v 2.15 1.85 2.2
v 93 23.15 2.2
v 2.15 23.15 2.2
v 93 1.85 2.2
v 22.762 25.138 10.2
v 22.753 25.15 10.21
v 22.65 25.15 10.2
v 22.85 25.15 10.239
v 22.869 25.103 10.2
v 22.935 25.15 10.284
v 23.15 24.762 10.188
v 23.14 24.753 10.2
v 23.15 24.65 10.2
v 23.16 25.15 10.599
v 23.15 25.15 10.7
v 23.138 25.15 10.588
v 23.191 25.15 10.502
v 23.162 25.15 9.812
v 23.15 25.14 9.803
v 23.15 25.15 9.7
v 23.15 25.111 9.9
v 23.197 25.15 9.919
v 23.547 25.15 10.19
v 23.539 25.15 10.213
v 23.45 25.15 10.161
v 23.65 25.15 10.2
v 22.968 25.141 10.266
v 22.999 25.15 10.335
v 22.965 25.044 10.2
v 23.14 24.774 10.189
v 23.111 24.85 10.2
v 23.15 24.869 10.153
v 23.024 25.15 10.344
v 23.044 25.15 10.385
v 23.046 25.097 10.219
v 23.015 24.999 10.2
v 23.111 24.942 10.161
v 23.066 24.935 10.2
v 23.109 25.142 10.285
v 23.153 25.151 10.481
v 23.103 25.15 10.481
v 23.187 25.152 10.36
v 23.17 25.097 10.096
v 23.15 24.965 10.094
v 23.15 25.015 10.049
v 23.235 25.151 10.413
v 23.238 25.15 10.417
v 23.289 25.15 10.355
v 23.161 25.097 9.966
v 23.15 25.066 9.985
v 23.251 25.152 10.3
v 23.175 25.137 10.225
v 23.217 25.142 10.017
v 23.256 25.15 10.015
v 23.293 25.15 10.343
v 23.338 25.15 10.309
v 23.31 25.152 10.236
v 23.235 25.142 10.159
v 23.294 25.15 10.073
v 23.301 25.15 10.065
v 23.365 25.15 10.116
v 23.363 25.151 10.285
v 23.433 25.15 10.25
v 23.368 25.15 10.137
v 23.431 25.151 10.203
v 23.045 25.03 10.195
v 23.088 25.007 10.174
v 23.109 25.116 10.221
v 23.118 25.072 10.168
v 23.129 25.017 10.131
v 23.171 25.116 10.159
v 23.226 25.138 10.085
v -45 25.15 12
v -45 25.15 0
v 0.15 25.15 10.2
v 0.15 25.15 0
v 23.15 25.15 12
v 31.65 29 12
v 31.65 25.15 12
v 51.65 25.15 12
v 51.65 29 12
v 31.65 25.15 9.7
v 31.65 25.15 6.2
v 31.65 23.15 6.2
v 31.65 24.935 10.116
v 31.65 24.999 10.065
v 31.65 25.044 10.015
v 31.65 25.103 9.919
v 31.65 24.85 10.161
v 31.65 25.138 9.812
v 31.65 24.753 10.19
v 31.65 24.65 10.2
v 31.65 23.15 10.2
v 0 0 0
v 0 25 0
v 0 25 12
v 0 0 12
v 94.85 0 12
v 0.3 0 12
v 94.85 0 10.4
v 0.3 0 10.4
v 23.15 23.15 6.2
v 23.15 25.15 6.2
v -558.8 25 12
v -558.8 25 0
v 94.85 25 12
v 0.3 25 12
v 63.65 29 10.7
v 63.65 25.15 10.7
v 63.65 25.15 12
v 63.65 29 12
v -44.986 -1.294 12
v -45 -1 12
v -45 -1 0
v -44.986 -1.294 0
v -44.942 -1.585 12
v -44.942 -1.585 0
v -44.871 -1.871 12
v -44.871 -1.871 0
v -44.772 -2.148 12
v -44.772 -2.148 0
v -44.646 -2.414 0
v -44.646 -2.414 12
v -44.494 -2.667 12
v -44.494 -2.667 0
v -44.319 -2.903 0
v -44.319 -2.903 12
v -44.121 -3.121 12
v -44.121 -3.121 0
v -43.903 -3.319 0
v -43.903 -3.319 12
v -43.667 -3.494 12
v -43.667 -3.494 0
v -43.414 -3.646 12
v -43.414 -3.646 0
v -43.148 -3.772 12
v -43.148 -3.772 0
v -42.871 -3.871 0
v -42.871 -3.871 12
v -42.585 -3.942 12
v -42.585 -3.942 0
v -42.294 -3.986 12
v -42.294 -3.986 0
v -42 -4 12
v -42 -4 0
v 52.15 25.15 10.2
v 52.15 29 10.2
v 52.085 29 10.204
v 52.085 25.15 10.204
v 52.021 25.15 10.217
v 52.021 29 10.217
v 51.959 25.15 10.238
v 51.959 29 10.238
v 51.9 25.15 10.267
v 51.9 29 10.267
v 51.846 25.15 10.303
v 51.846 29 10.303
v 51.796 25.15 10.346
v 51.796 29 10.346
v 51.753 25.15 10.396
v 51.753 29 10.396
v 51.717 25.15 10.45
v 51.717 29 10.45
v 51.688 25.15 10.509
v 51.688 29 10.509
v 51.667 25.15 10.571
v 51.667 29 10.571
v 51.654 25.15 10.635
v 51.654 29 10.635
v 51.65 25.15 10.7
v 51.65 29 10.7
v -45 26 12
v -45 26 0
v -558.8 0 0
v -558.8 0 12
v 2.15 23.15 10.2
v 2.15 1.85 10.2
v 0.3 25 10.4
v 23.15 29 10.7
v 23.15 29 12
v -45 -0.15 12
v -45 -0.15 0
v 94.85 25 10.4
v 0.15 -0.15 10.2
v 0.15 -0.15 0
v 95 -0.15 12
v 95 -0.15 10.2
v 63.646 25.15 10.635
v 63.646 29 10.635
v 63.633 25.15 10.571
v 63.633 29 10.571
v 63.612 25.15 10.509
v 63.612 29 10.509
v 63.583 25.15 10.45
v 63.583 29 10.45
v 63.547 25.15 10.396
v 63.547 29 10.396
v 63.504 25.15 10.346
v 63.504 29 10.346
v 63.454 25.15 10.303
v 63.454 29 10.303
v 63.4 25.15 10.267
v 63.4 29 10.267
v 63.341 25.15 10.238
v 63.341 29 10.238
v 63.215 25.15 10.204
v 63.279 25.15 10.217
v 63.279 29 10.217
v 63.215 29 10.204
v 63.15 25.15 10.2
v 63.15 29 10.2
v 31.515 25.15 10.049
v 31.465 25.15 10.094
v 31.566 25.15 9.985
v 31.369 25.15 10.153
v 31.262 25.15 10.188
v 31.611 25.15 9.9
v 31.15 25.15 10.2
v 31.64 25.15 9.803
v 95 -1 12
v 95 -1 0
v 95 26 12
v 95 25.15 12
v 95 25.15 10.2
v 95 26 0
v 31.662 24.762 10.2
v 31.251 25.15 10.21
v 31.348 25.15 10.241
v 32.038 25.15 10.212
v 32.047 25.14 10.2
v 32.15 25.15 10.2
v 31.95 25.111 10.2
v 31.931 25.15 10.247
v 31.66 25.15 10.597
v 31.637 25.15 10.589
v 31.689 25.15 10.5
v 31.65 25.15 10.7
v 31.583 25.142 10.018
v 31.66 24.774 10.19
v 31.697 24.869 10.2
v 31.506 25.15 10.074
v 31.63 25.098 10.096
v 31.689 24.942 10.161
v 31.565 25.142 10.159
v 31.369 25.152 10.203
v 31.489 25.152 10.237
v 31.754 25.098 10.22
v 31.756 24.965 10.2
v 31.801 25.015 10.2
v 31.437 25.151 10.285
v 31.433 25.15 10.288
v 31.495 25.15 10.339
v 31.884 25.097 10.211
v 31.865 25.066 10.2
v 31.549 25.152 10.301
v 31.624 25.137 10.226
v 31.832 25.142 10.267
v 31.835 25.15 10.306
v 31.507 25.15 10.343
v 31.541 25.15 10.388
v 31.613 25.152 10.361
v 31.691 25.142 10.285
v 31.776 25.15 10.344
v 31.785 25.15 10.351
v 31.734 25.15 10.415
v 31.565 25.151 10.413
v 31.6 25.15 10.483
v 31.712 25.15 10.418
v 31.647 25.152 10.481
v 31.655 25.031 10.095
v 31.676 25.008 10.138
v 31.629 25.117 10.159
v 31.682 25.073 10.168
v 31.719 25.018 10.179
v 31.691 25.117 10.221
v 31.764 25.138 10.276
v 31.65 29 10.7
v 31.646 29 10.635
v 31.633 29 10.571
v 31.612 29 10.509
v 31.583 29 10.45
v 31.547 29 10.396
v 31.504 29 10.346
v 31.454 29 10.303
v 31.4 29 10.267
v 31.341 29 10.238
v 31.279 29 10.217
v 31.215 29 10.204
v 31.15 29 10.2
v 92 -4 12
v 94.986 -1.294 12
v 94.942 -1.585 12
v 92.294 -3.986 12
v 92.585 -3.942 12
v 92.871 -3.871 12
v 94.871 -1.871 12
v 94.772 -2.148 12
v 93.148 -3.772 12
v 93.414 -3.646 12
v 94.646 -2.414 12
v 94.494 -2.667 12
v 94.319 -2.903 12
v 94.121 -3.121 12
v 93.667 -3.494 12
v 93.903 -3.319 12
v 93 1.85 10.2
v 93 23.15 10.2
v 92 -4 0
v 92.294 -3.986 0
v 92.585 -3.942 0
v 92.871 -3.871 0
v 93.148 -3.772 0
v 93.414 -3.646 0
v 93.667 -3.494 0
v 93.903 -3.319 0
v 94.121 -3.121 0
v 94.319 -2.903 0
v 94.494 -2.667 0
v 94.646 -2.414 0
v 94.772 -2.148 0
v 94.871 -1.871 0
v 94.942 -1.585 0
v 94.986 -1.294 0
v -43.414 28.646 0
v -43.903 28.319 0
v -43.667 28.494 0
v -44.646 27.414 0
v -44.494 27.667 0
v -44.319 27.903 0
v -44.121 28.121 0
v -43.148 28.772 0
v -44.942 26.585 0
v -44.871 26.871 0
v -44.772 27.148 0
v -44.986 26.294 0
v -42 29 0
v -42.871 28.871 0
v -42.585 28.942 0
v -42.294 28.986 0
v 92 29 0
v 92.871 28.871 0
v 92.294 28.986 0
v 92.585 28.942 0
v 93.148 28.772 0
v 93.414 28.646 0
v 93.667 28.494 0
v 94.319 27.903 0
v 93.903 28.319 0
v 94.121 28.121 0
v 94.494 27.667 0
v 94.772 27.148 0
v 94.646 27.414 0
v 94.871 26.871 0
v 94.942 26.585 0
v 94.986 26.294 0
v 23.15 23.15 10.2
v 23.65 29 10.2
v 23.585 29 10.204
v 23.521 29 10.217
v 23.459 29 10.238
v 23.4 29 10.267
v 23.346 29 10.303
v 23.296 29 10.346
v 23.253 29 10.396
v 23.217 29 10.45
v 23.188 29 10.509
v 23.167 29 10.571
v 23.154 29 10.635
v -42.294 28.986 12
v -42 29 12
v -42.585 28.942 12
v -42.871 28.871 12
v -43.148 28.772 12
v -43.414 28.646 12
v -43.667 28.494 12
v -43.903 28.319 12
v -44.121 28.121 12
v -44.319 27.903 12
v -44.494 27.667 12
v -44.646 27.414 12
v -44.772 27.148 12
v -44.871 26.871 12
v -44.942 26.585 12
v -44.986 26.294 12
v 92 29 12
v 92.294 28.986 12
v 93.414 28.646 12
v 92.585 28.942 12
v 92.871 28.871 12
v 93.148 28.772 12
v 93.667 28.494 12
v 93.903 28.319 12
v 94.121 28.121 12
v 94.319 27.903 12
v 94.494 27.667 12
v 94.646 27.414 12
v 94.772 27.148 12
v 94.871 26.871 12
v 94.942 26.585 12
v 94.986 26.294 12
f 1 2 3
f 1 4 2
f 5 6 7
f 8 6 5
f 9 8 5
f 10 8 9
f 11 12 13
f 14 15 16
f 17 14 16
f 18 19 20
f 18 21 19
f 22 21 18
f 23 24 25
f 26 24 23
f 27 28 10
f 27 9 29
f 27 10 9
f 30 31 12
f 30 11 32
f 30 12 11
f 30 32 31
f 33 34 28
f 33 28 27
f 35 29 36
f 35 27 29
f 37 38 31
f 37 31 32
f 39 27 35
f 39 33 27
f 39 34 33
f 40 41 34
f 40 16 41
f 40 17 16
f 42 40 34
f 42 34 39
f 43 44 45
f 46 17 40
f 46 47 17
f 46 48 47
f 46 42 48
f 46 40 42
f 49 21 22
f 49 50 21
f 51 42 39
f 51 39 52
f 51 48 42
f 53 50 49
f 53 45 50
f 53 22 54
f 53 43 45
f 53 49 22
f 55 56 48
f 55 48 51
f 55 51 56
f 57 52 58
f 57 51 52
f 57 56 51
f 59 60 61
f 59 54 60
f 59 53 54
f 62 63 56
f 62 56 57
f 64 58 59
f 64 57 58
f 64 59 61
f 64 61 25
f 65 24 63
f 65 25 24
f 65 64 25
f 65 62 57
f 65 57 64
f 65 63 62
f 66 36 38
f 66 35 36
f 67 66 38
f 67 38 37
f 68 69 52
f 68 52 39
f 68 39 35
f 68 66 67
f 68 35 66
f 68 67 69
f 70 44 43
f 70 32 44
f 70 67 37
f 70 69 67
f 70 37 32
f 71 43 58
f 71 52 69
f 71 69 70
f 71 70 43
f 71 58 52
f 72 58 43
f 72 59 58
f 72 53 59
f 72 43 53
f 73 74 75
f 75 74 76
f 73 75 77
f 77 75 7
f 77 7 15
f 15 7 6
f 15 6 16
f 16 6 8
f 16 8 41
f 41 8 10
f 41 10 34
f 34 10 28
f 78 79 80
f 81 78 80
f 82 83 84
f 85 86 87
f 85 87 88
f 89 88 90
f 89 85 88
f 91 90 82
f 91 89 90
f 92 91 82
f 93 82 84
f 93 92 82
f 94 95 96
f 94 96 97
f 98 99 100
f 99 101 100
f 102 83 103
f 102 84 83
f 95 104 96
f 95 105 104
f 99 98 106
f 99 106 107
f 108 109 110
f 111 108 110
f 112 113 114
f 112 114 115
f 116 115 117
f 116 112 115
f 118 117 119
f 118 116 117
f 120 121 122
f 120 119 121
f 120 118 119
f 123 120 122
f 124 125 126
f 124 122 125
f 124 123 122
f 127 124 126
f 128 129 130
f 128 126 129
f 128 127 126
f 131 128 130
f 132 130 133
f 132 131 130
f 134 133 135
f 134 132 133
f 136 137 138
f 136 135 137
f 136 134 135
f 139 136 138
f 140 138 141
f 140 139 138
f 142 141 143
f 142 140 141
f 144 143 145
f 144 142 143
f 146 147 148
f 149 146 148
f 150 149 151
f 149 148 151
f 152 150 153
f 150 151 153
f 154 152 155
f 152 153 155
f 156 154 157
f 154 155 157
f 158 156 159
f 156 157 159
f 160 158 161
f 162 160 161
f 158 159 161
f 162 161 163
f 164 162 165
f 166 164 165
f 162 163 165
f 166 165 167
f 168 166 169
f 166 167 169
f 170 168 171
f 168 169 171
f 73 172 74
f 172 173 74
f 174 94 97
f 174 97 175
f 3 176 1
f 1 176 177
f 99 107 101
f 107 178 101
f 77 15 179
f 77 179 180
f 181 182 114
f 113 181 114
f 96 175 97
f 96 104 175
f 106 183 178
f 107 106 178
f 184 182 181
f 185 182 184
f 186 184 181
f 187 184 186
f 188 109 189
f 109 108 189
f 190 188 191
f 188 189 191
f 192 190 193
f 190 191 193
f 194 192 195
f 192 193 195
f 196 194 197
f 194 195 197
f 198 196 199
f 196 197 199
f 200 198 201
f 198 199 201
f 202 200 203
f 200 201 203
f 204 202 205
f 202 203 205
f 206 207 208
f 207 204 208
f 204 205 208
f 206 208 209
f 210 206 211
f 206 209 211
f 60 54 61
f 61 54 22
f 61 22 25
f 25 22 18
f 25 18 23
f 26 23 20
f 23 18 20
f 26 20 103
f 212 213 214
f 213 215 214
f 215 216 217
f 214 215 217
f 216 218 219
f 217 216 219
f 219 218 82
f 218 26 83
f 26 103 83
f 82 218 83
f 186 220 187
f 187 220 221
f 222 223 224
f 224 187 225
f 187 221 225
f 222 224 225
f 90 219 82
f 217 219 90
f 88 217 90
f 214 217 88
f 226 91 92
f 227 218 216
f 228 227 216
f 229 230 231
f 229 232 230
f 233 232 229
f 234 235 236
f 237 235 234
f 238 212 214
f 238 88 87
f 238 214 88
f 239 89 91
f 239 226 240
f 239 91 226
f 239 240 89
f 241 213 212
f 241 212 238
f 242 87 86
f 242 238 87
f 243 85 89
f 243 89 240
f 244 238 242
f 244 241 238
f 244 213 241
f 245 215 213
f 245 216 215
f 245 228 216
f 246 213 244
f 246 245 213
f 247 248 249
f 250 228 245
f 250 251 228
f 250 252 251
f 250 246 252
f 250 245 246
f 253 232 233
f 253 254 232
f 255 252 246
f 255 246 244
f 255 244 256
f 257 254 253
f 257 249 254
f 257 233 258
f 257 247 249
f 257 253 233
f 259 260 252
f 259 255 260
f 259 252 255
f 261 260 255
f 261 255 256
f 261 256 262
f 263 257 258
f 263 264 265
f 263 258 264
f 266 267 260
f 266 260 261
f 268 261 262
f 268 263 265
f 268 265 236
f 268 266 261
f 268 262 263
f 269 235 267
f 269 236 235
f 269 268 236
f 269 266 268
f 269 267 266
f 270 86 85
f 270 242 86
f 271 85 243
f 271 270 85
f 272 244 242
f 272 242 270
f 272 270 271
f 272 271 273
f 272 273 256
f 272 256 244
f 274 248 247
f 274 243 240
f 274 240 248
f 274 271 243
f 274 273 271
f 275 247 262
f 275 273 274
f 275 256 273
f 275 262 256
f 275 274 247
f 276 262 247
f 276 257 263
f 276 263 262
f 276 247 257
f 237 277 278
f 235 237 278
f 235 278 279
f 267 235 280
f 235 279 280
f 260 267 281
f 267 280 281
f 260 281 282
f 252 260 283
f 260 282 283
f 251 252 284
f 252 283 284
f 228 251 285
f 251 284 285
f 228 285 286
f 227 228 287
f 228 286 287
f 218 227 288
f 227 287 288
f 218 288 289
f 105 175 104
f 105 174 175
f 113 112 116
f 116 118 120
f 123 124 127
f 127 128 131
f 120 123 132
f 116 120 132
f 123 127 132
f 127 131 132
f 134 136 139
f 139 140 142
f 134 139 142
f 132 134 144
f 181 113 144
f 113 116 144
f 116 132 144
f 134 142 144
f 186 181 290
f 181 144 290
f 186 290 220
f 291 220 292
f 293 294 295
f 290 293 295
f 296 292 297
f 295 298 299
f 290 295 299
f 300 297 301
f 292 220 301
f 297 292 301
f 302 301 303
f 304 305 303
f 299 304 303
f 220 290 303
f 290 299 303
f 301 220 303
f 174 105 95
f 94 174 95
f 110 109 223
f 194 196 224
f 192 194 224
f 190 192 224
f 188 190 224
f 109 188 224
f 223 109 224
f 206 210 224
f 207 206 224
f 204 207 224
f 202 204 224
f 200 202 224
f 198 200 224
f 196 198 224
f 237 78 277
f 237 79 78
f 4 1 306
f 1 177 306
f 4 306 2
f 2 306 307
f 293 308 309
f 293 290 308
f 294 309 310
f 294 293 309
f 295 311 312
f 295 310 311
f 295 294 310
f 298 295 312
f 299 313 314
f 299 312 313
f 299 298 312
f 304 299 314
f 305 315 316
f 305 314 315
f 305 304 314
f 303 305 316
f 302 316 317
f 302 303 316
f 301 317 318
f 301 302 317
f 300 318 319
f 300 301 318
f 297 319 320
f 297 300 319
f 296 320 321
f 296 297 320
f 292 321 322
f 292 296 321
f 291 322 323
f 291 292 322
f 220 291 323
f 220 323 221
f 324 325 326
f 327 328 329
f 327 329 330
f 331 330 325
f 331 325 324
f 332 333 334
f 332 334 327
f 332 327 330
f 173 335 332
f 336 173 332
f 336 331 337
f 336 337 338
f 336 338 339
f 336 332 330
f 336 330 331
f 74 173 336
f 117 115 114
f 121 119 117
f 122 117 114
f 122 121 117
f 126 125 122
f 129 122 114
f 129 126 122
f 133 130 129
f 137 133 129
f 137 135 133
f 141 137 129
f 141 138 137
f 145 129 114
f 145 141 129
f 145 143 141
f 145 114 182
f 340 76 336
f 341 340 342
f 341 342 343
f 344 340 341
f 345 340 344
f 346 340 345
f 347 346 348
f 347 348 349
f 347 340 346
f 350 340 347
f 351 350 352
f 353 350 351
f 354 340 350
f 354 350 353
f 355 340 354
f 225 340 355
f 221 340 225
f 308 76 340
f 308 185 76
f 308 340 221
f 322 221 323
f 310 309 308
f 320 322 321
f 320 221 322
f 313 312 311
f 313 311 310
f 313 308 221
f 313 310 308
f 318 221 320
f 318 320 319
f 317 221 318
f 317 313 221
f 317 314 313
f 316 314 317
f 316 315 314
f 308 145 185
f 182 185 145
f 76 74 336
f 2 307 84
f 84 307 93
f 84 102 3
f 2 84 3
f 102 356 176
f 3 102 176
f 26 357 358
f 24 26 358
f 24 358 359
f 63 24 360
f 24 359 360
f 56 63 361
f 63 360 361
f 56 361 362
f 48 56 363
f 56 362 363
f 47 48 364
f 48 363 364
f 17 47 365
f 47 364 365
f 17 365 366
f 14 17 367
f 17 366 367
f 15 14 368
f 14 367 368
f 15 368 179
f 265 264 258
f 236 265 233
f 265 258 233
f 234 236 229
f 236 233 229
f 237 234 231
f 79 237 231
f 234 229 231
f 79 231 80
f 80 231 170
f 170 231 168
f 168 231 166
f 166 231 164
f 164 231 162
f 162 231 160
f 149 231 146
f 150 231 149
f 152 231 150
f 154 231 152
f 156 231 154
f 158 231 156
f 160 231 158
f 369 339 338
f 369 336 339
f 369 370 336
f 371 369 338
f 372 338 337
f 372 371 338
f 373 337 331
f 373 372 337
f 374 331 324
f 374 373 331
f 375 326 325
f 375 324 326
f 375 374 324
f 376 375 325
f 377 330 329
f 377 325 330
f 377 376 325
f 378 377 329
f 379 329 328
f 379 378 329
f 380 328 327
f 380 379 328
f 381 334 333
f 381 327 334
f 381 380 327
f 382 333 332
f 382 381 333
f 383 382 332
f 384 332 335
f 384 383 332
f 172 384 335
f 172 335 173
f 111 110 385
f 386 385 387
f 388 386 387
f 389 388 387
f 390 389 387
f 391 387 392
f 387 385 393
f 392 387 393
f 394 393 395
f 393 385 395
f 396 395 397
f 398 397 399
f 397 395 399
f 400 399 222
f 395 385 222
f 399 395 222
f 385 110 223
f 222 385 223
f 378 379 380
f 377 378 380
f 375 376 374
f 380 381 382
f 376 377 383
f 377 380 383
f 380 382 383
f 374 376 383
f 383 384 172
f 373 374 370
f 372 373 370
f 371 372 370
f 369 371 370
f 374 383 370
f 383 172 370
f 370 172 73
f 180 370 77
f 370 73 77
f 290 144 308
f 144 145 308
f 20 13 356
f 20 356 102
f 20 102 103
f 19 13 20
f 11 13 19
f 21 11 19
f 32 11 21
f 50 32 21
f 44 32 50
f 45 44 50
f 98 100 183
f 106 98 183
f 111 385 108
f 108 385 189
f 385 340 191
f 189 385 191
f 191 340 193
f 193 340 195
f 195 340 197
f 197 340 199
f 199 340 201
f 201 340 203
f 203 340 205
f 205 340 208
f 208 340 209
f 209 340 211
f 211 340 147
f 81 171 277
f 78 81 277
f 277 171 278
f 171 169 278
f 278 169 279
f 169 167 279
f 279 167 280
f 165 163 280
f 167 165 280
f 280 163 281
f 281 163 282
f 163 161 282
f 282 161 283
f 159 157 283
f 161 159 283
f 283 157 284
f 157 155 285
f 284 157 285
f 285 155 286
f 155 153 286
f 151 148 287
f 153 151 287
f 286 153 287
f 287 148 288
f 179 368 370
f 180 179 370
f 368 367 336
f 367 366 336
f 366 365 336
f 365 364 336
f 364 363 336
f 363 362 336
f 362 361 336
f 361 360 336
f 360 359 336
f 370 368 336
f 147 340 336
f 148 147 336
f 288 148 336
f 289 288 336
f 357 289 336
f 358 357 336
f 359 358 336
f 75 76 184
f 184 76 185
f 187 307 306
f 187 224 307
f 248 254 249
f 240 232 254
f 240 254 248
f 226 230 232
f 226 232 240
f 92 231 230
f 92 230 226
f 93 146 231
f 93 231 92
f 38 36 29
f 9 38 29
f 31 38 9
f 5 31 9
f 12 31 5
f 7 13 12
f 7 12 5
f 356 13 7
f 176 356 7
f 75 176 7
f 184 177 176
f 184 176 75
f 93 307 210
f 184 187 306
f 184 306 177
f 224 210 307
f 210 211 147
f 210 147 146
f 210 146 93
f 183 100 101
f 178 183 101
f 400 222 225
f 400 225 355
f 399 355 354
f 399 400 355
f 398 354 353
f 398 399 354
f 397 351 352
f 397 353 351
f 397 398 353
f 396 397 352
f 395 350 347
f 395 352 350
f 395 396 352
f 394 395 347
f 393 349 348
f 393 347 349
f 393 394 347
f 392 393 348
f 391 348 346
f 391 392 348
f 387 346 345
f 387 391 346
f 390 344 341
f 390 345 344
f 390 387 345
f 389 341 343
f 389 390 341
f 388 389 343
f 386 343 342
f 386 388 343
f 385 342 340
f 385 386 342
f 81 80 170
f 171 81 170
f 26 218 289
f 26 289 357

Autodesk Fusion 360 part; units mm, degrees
sketch "Sketch1" plane through (0, 0, 0) normal (0, 0, 1) x (1, 0, 0)
  line L0 (0, 0) -> (-558.8, 0)
  line L1 (-558.8, 0) -> (-558.8, 25)
  line L2 (-558.8, 25) -> (0, 25)
  line L3 (0, 25) -> (0, 0)
  dimension "d1" = 25
  dimension "d2" = 558.8
extrude "Extrude1" add sketch "Sketch1" along normal blind 12 makes body 1
sketch "Sketch2" plane through (0, 0, 0) normal (0, 0, -1) x (1, 0, 0)
  line L0 (-558.8, -25) -> (0, -25)
  line L1 (0, -25) -> (0, 0)
  line L2 (0, 0) -> (-558.8, 0)
  line L3 (-558.8, 0) -> (-558.8, -25)
  line L4 (-45, 0) -> (-45, -25)
  line L5 (-45, -25) -> (0, -25)
  line L6 (0, -25) -> (0, 0)
  line L7 (-45, 0) -> (-45, 4)
  line L8 (-45, 4) -> (95, 4)
  line L9 (95, 4) -> (95, -29)
  line L10 (95, -29) -> (-45, -29)
  line L11 (-45, -29) -> (-45, -25)
  line L12 (-45, 0) -> (0, 0)
  line L13 (-45, 0.15) -> (0.15, 0.15)
  line L14 (0.15, -25.15) -> (0.15, 0.15)
  line L15 (-45, -25.15) -> (0.15, -25.15)
  line L16 (0.15, -20) -> (-90.15, -20)
  line L17 (-90.15, -20) -> (-90.15, -5)
  line L18 (-90.15, -5) -> (0.15, -5)
  line L19 (0.15, -5) -> (0.15, -20)
  line L20 (0.15, -20) -> (-90.15, -5) construction
  line L21 (-90.15, -20) -> (0.15, -5) construction
  line L22 (-40, -25.15) -> (-40, 0.15)
  point P0 (-45, -12.5)
  dimension "d5" = 45
  dimension "d6" = 4
  dimension "d8" = -0.15
  dimension "d9" = 140
  dimension "d12" = 5
  dimension "d38" = 5
extrude "Extrude19" add sketch "Sketch2" against normal blind 12 separate body contours L7 L8 L9 L10 L11 L13 L14 L15 L19 makes body 2
sketch "Sketch10" plane through (0, 0, 12) normal (0, 0, 1) x (-1, 0, 0)
  line L0 (-0.15, 0.15) -> (45, 0.15)
  line L1 (45, 0.15) -> (45, 4)
  line L2 (45, 4) -> (-95, 4)
  line L3 (-95, 4) -> (-95, -29)
  line L4 (-95, -29) -> (45, -29)
  line L5 (45, -29) -> (45, -25.15)
  line L6 (45, -25.15) -> (-0.15, -25.15)
  line L7 (-0.15, -25.15) -> (-0.15, 0.15)
  line L8 (-0.15, 0.15) -> (-95, 0.15)
  line L9 (-95, 0.15) -> (-95, -25.15)
  line L10 (-95, -25.15) -> (-0.15, -25.15)
  line L11 (-0.15, -25.15) -> (-0.15, 0.15)
extrude "Extrude20" cut sketch "Sketch10" against normal blind 1.8 contours L3 L7 L8 L9 L10 L11 bodies 2
sketch "Sketch12" plane through (0, 0, 10.2) normal (0, 0, 1) x (-1, 0, 0)
  line L0 (-0.15, -25.15) -> (-0.15, 0.15)
  line L1 (-0.15, 0.15) -> (-95, 0.15)
  line L2 (-95, 0.15) -> (-95, -25.15)
  line L3 (-95, -25.15) -> (-0.15, -25.15)
  line L4 (-0.3, 0) -> (-94.85, 0)
  line L5 (-94.85, 0) -> (-94.85, -25)
  line L6 (-94.85, -25) -> (-0.3, -25)
  line L7 (-0.3, -25) -> (-0.3, 0)
  dimension "d98" = -0.15
extrude "Extrude22" add sketch "Sketch12" along normal blind 1.6 from surface at 0.2 separate body contours L4 L5 L6 L7 makes body 3
sketch "Sketch11" plane through (0, 0, 10.2) normal (0, 0, 1) x (-1, 0, 0)
  line L0 (-0.15, -25.15) -> (-0.15, 0.15)
  line L1 (-0.15, 0.15) -> (-95, 0.15)
  line L2 (-95, 0.15) -> (-95, -25.15)
  line L3 (-95, -25.15) -> (-0.15, -25.15)
  line L4 (-47.575, -25.15) -> (-47.575, 0.15) construction
  line L5 (-95, -12.5) -> (-47.575, -12.5) construction
  line L6 (-93, -23.15) -> (-2.15, -23.15)
  line L7 (-2.15, -23.15) -> (-2.15, -1.85)
  line L8 (-2.15, -1.85) -> (-93, -1.85)
  line L9 (-93, -1.85) -> (-93, -23.15)
  line L10 (-93, -23.15) -> (-2.15, -1.85) construction
  line L11 (-2.15, -23.15) -> (-93, -1.85) construction
  point P0 (-47.575, -12.5)
  dimension "d93" = 2
  dimension "d94" = 2
extrude "Extrude21" cut sketch "Sketch11" against normal blind 8 contours L6 L7 L8 L9 bodies 2
sketch "Sketch13" plane through (0, 0, 12) normal (0, 0, 1) x (-1, 0, 0)
  line L0 (-0.3, -25) -> (-0.3, 0)
  line L1 (-0.3, 0) -> (-94.85, 0)
  line L2 (-94.85, 0) -> (-94.85, -25)
  line L3 (-94.85, -25) -> (-0.3, -25)
sketch "Sketch15" plane through (0, 0, 10.2) normal (0, 0, 1) x (-1, 0, 0)
  line L0 (-2.15, -23.15) -> (-93, -23.15)
  line L1 (-93, -23.15) -> (-93, -1.85)
  line L2 (-93, -1.85) -> (-2.15, -1.85)
  line L3 (-2.15, -1.85) -> (-2.15, -23.15)
  line L4 (-0.15, -25.15) -> (-0.15, 0.15)
  line L5 (-0.15, 0.15) -> (-95, 0.15)
  line L6 (-95, 0.15) -> (-95, -25.15)
  line L7 (-95, -25.15) -> (-0.15, -25.15)
  line L8 (-0.15, -25.15) -> (-23.15, -25.15)
  line L9 (-23.15, -25.15) -> (-31.65, -25.15)
  line L10 (-23.15, -25.15) -> (-31.65, -25.15)
  line L11 (-31.65, -25.15) -> (-31.65, -23.15)
  line L12 (-31.65, -23.15) -> (-23.15, -23.15)
  line L13 (-23.15, -23.15) -> (-23.15, -25.15)
  line L14 (-31.65, -25.15) -> (-51.65, -25.15)
  line L15 (-51.65, -25.15) -> (-63.65, -25.15)
  dimension "d102" = 23
  dimension "d103" = 8.5
  dimension "d106" = 20
  dimension "d107" = 12
extrude "Extrude23" cut sketch "Sketch15" against normal blind 4 contours L0 L7 L9 L10 L11 L12 L13 bodies 2
sketch "Sketch16" plane through (0, 25.15, 0) normal (0, -1, 0) x (1, 0, 0)
  line L0 (-45, 0) -> (0.15, 0)
  line L1 (0.15, 0) -> (0.15, 10.2)
  line L2 (0.15, 10.2) -> (23.15, 10.2)
  line L3 (23.15, 10.2) -> (23.15, 6.2)
  line L4 (23.15, 6.2) -> (31.65, 6.2)
  line L5 (31.65, 6.2) -> (31.65, 10.2)
  line L6 (31.65, 10.2) -> (95, 10.2)
  line L7 (95, 10.2) -> (95, 12)
  line L8 (95, 12) -> (-45, 12)
  line L9 (-45, 12) -> (-45, 0)
  line L10 (31.65, 10.2) -> (51.65, 10.2)
  line L11 (51.65, 10.2) -> (63.65, 10.2)
  line L12 (51.65, 10.2) -> (63.65, 10.2)
  line L13 (63.65, 10.2) -> (63.65, 12)
  line L14 (63.65, 12) -> (51.65, 12)
  line L15 (51.65, 12) -> (51.65, 10.2)
  line L16 (31.65, 10.2) -> (23.15, 10.2)
  line L17 (23.15, 10.2) -> (23.15, 12)
  line L18 (23.15, 12) -> (31.65, 12)
  line L19 (31.65, 12) -> (31.65, 10.2)
  dimension "d108" = 20
  dimension "d109" = 12
extrude "Extrude24" cut sketch "Sketch16" against normal blind 17.39 contours L8 L16 L17 L18 L19 | L6 L8 L11 L12 L13 L14 L15 bodies 2
fillet "Fillet1" radius 3 4 edges at (-45, -4, 6) (95, -4, 6) (95, 29, 6) (-45, 29, 6) on bodies 2
fillet "Fillet2" radius 0.5 4 edges at (31.65, 27.075, 10.2) (63.65, 27.075, 10.2) (23.15, 27.075, 10.2) (51.65, 27.075, 10.2) on bodies 2
